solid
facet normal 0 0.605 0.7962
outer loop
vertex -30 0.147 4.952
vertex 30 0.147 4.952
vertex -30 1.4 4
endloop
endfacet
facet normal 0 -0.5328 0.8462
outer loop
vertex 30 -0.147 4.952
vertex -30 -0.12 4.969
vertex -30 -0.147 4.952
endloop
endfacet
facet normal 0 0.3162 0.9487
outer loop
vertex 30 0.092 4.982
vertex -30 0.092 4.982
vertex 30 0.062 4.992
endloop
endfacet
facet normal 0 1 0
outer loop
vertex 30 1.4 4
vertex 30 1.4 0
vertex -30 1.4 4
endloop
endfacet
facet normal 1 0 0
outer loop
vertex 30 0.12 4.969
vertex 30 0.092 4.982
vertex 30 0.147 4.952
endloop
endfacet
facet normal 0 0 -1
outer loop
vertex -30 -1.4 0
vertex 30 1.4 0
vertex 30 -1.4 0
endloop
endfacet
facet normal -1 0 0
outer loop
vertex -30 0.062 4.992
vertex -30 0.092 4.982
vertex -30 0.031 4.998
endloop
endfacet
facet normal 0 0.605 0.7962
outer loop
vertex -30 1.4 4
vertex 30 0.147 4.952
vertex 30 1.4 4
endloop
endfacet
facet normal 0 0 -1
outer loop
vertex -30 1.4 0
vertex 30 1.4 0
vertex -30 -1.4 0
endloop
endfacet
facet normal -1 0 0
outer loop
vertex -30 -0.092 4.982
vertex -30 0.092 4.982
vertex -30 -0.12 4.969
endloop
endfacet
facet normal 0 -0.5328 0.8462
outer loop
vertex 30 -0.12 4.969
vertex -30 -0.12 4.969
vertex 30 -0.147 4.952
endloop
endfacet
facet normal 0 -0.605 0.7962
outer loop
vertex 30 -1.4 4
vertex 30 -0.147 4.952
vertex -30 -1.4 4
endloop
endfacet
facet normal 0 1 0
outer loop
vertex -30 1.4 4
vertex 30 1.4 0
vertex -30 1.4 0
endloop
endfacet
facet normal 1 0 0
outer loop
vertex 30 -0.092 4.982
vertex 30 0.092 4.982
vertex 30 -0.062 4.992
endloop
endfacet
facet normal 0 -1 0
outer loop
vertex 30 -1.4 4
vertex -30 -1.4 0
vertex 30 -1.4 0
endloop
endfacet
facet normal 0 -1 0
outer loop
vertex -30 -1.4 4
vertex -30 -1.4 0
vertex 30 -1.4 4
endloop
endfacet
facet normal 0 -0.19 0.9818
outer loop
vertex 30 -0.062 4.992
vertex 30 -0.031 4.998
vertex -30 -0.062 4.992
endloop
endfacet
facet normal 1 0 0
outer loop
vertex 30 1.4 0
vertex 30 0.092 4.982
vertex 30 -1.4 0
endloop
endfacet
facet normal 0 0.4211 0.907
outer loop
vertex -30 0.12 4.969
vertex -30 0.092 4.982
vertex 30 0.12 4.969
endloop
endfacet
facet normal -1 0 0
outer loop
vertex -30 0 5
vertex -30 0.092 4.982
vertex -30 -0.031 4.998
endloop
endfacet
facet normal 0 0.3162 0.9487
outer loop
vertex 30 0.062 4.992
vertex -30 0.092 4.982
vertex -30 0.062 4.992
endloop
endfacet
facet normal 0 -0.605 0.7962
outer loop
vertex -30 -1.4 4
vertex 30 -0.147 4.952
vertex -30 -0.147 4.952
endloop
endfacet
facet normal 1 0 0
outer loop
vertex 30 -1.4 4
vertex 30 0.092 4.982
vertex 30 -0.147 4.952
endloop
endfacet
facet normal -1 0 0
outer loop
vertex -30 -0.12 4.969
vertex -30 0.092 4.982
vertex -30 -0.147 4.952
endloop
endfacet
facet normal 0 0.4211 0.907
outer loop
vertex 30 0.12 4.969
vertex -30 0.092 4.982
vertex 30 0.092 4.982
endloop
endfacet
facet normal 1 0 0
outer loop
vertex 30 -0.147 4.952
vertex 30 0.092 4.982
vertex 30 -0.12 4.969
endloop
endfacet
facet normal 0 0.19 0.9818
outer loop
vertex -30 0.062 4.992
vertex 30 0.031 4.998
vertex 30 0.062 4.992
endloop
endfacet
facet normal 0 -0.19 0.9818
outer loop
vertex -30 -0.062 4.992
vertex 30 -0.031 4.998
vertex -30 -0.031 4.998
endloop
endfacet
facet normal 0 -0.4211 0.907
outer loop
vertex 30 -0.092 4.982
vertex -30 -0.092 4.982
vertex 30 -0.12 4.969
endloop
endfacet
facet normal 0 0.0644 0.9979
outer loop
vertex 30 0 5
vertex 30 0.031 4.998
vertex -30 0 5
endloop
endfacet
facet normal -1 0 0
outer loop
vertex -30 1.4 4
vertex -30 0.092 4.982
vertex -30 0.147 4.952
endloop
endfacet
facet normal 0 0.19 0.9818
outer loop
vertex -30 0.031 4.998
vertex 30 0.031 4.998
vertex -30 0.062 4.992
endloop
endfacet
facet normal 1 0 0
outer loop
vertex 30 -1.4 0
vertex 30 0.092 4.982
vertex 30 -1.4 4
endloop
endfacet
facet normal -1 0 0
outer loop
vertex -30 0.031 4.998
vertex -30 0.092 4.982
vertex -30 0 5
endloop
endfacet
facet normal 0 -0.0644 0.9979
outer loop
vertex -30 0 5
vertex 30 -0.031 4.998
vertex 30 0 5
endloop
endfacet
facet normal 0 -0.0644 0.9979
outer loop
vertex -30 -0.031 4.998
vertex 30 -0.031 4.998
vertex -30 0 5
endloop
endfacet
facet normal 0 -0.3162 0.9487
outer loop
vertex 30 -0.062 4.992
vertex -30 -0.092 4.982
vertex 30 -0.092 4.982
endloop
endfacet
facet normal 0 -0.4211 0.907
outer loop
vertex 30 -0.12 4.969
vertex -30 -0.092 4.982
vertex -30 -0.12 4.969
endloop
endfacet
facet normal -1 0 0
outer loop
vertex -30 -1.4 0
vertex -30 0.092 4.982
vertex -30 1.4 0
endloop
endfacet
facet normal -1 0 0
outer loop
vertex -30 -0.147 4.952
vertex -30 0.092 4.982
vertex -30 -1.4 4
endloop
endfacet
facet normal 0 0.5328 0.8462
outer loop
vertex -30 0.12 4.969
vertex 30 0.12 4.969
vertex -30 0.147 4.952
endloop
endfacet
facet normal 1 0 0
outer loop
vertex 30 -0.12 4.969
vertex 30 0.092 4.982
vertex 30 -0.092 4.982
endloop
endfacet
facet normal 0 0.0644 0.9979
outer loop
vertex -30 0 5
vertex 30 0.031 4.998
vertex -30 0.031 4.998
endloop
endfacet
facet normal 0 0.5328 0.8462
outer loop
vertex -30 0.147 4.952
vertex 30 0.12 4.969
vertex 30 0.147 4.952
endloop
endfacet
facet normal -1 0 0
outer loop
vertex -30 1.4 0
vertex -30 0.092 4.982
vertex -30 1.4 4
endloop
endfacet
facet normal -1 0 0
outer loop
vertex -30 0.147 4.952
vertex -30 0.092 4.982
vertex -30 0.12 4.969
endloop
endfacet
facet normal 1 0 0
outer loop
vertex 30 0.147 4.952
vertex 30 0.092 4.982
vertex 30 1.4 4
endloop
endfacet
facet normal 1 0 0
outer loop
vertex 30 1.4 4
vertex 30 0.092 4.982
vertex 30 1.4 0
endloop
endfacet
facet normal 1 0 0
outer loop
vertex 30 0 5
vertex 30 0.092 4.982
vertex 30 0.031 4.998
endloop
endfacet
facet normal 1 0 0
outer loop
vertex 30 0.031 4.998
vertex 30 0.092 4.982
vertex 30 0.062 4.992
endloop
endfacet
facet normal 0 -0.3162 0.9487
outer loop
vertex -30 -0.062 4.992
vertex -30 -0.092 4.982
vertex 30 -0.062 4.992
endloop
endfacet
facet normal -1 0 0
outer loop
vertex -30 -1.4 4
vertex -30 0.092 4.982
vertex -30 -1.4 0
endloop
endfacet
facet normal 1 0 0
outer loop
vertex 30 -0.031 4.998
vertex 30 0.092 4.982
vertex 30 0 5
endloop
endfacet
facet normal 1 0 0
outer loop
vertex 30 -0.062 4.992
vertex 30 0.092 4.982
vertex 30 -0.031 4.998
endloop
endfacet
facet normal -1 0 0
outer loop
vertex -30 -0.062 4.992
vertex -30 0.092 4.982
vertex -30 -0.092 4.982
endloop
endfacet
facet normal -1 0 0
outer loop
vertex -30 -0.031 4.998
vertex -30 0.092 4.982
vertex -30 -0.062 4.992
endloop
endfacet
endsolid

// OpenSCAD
$fn=50;

sl = 60;  // saddle slot length
st = 2.8;   // saddle slot thick
ss = 4;   // saddle slot depth
sh = 1;   // saddle height above slot
sr = 0.25;  // saddle diameter

hull() {
    translate([0,0,ss/2]) cube([sl,st,ss], center=true);
    translate([0,0,ss+sh-sr]) rotate([0,90,0]) cylinder(h=sl, r=sr, center=true);
}
